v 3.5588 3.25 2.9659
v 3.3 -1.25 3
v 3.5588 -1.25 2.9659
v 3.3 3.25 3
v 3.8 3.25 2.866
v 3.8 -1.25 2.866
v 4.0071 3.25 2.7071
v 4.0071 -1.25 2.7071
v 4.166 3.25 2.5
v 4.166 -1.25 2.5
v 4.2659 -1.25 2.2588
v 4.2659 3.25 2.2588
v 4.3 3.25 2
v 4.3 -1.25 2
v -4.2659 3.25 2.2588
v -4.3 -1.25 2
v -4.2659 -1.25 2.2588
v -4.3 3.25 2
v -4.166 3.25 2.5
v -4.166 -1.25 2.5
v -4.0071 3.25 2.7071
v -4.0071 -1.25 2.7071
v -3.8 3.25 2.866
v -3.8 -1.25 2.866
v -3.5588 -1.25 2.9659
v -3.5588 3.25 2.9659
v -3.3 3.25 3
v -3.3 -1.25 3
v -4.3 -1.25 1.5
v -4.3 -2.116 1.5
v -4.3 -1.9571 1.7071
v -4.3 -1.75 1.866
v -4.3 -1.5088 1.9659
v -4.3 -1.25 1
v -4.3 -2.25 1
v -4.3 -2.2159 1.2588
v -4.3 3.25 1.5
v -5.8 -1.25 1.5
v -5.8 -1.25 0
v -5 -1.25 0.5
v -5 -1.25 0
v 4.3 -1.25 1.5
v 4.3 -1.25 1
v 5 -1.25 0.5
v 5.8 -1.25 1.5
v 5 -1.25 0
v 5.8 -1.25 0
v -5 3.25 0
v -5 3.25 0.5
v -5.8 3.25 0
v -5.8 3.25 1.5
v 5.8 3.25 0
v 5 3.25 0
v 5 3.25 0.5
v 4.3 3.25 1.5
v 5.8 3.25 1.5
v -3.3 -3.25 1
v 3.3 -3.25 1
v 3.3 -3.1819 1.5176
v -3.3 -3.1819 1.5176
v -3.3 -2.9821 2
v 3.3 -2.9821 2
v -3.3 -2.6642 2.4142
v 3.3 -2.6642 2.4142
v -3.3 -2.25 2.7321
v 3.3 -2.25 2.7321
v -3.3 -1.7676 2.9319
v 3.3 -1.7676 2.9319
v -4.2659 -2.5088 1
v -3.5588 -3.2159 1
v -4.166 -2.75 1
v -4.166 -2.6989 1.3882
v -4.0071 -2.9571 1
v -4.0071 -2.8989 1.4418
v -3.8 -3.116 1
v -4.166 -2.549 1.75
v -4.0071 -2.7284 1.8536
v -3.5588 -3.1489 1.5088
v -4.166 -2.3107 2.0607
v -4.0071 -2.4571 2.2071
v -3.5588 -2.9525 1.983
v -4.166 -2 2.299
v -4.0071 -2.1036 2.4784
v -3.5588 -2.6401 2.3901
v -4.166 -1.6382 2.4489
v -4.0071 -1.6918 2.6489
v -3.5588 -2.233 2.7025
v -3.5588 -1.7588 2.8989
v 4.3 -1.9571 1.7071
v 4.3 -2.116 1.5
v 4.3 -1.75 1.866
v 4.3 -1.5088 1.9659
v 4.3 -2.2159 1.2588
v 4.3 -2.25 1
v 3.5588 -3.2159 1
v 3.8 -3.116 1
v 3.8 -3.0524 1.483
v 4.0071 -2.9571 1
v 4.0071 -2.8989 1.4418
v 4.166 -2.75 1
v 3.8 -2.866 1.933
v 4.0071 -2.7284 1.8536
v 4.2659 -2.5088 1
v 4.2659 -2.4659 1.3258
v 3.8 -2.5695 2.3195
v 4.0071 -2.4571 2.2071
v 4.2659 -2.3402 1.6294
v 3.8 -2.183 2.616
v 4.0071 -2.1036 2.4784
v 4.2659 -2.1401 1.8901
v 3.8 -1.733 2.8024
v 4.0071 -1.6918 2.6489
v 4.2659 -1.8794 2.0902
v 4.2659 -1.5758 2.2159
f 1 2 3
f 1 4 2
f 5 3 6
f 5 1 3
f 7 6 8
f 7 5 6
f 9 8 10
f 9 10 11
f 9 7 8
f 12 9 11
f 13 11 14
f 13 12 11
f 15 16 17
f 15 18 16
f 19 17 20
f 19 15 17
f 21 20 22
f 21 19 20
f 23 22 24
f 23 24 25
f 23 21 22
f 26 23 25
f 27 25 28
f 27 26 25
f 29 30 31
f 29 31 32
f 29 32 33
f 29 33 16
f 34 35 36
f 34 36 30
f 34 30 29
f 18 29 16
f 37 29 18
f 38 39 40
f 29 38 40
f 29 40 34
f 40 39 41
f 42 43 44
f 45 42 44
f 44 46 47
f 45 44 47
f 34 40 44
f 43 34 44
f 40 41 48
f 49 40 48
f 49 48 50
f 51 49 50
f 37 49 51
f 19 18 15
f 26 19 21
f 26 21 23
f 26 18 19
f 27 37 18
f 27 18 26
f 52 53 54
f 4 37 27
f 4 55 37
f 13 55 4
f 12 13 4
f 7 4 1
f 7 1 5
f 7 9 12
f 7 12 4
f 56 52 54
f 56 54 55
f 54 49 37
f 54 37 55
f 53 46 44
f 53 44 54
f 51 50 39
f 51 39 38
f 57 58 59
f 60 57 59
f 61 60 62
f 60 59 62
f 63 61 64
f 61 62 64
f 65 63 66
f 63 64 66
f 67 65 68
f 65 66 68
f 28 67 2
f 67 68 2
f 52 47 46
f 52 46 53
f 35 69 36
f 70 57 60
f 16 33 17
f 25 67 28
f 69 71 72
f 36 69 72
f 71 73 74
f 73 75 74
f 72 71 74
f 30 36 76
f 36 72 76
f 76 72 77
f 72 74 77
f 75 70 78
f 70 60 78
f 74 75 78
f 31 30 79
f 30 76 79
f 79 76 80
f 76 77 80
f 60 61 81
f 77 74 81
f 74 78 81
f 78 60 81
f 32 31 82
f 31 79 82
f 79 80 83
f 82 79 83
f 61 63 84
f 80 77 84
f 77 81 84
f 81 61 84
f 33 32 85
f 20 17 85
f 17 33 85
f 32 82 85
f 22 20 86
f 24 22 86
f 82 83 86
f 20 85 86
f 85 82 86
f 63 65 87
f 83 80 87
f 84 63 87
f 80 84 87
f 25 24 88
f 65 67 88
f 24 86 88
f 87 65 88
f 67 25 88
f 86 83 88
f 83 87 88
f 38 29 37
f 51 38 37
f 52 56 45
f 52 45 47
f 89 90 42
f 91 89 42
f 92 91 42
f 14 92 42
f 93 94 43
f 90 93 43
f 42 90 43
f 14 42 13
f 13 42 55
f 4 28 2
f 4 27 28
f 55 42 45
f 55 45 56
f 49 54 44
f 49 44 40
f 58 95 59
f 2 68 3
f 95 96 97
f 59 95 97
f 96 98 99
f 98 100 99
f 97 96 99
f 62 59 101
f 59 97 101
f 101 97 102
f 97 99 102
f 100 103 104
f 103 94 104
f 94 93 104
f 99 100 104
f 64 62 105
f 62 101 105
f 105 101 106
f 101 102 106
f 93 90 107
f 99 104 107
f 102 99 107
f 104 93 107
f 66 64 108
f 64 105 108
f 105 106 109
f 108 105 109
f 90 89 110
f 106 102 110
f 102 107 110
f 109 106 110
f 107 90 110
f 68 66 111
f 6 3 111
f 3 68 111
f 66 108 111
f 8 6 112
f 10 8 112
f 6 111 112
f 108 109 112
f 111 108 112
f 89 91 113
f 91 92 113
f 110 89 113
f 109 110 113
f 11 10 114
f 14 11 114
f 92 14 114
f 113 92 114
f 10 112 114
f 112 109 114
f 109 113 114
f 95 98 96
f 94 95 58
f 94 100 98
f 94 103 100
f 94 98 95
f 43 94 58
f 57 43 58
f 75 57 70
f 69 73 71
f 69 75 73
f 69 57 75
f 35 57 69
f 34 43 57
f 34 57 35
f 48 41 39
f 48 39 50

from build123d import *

# Parameters (mm, degrees)
SKETCH_1_W          = 8.6
SKETCH_1_H          = 6.5
EXTRUDE_1_DEPTH     = 3
FILLET_1_R          = 2
SKETCH_2_W          = 1.5
SKETCH_2_H          = 4.5
EXTRUDE_2_DEPTH     = 1.5
SKETCH_3_W          = 1.5
SKETCH_3_H          = 4.5
EXTRUDE_3_DEPTH     = 1.5
FILLET_2_R          = 1
FILLET_3_R          = 1
CUT_EXTRUDE_1_DEPTH = 1
SKETCH_5_W          = 10
SKETCH_5_H          = 4.5
CUT_EXTRUDE_2_DEPTH = 0.5


with BuildPart() as part:
    # 草图1 → 凸台-拉伸1 (new body)
    with BuildSketch(Plane.XY):
        Rectangle(SKETCH_1_W, SKETCH_1_H)
    extrude(amount=EXTRUDE_1_DEPTH)

    # 圆角1
    fillet_1_edges = [part.edges().sort_by_distance(p)[0] for p in [
        (0, -3.25, 3),
    ]]
    fillet(fillet_1_edges, radius=FILLET_1_R)

    # 草图2 → 凸台-拉伸2 (add)
    with BuildSketch(Plane(origin=(4.3, 0, 0), x_dir=(0, 0, -1), z_dir=(1, 0, 0))):
        with Locations((-0.75, 1)):
            Rectangle(SKETCH_2_W, SKETCH_2_H)
    extrude(amount=EXTRUDE_2_DEPTH)

    # 草图3 → 凸台-拉伸3 (add)
    with BuildSketch(Plane.ZY.offset(4.3)):
        with Locations((0.75, 1)):
            Rectangle(SKETCH_3_W, SKETCH_3_H)
    extrude(amount=EXTRUDE_3_DEPTH)

    # 圆角2
    fillet_2_edges = [part.edges().sort_by_distance(p)[0] for p in [
        (4.3, 1, 3),
        (4.3, -3.25, 0.5),
        (4.3, -2.664213562, 2.414213562),
    ]]
    fillet(fillet_2_edges, radius=FILLET_2_R)

    # 圆角3
    fillet_3_edges = [part.edges().sort_by_distance(p)[0] for p in [
        (-4.3, 1, 3),
        (-4.3, -3.25, 0.5),
        (-4.3, -2.664213562, 2.414213562),
    ]]
    fillet(fillet_3_edges, radius=FILLET_3_R)

    # 草图4 → 切除-拉伸1 (cut)
    with BuildSketch(Plane(origin=(0, 0, 0), x_dir=(-1, 0, 0), z_dir=(0, 0, -1))):
        with BuildLine():
            Line((-4.3, -1.25), (-4.3, -2.25))
            ThreePointArc((-4.3, -2.25), (-4.007106781, -2.957106781), (-3.3, -3.25))
            Line((-3.3, -3.25), (3.3, -3.25))
            ThreePointArc((3.3, -3.25), (4.007106781, -2.957106781), (4.3, -2.25))
            Line((4.3, -2.25), (4.3, -1.25))
            Line((4.3, -1.25), (-4.3, -1.25))
        make_face()
    extrude(amount=-CUT_EXTRUDE_1_DEPTH, mode=Mode.SUBTRACT)

    # 草图5 → 切除-拉伸2 (cut)
    with BuildSketch(Plane(origin=(0, 0, 0), x_dir=(-1, 0, 0), z_dir=(0, 0, -1))):
        with Locations((0, 1)):
            Rectangle(SKETCH_5_W, SKETCH_5_H)
    extrude(amount=-CUT_EXTRUDE_2_DEPTH, mode=Mode.SUBTRACT)


solid = part.part
